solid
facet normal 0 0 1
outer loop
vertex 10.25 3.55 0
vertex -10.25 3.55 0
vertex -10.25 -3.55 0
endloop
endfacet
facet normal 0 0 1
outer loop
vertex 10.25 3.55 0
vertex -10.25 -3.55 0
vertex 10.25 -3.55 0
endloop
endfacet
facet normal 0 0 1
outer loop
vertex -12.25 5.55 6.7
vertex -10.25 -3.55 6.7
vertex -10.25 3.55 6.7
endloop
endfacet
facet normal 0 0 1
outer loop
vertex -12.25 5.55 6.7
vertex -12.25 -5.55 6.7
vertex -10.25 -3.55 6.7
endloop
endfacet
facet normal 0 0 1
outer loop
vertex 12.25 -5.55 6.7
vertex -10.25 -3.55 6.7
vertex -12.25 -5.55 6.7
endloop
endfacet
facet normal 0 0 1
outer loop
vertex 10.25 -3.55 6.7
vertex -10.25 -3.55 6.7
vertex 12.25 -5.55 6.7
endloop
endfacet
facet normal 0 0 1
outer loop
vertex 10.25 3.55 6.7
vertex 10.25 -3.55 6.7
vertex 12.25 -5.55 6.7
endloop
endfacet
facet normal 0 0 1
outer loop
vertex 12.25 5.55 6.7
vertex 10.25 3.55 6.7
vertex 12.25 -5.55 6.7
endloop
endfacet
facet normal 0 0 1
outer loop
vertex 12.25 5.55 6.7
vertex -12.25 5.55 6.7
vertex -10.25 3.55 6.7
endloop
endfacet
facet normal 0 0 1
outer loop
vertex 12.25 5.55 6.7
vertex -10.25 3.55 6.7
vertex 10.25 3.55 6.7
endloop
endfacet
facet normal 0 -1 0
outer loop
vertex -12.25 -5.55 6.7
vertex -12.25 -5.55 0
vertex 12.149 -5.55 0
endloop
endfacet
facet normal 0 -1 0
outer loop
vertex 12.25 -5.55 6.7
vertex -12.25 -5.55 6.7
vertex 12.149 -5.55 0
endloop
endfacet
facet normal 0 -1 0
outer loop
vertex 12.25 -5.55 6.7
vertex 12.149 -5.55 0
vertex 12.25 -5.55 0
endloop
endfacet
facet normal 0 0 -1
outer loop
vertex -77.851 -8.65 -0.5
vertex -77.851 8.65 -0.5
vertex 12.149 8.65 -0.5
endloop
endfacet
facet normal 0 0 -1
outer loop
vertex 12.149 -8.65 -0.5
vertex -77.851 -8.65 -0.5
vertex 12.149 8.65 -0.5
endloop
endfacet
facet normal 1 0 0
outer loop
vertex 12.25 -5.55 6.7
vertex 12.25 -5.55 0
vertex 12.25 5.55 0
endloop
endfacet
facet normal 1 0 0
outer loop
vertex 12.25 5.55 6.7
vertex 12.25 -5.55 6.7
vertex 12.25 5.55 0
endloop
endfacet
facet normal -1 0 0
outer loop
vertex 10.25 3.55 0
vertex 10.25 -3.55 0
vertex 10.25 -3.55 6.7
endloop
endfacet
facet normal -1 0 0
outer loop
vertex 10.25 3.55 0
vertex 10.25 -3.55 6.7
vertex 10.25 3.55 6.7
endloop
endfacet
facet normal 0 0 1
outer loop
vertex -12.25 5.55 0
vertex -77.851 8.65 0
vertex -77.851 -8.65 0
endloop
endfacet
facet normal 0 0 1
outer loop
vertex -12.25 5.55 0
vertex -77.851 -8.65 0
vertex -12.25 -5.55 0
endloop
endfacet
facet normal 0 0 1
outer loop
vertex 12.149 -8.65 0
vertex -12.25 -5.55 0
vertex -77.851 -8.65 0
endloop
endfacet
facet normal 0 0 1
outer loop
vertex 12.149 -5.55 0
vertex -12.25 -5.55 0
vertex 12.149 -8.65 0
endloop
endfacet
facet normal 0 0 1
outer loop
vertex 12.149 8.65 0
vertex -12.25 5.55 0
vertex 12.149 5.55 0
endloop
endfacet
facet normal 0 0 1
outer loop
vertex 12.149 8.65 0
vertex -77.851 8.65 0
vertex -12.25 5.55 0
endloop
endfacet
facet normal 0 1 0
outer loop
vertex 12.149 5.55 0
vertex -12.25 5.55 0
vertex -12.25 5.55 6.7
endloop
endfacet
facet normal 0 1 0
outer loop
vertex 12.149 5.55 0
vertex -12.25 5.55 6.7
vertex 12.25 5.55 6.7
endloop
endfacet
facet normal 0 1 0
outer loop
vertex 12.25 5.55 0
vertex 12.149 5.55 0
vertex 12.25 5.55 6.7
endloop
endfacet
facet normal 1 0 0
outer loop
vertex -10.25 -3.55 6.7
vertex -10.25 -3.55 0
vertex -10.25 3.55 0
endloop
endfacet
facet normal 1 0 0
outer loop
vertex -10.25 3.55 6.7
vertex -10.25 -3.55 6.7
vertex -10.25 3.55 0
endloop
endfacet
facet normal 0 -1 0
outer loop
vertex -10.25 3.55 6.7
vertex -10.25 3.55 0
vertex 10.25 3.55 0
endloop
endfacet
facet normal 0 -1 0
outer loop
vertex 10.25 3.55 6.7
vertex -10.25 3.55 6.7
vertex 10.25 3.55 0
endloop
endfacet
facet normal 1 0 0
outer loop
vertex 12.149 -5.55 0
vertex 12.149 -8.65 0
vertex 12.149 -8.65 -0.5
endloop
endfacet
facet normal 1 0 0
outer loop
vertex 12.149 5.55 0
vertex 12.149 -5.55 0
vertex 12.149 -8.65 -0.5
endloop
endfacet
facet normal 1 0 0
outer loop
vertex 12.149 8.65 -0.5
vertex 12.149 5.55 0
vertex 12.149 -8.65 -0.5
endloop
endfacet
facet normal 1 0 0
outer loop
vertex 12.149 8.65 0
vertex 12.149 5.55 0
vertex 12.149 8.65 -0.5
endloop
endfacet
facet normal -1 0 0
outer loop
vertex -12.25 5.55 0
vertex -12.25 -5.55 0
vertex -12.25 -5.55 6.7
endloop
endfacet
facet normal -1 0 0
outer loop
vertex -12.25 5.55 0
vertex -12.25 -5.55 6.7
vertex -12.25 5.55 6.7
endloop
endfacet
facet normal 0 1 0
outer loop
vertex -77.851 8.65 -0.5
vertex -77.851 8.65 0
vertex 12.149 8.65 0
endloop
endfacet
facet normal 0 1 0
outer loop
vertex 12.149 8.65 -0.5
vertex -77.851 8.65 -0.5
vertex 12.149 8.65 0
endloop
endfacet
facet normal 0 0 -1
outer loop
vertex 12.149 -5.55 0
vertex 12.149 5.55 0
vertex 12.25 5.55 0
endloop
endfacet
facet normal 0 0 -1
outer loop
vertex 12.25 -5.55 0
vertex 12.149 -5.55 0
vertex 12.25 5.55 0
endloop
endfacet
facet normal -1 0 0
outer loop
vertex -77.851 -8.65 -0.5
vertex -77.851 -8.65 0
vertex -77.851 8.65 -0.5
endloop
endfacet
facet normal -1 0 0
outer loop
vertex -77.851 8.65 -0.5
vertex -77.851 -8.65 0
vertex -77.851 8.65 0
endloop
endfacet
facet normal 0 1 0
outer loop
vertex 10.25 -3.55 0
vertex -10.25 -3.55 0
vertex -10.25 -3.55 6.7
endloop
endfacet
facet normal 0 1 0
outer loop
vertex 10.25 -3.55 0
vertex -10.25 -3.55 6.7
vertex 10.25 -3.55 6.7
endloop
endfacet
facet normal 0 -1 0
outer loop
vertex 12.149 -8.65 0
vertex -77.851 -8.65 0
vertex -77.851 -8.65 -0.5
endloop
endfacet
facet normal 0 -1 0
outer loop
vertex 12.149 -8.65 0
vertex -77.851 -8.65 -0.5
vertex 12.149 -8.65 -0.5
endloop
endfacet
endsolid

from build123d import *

# Parameters (mm, degrees)
SKETCH_W     = 24.5
SKETCH_H     = 11.1
SKETCH_W_2   = 20.5
SKETCH_H_2   = 7.1
PAD_DEPTH    = 6.7
SKETCH001_W  = 90
SKETCH001_H  = 17.3
PAD001_DEPTH = 0.5


with BuildPart() as part:
    # Sketch (on Sketch) → Pad (new body)
    with BuildSketch(Plane.XY):
        Rectangle(SKETCH_W, SKETCH_H)
        Rectangle(SKETCH_W_2, SKETCH_H_2, mode=Mode.SUBTRACT)
    extrude(amount=PAD_DEPTH)

    # Sketch001 → Pad001 (join)
    with BuildSketch(Plane.XY):
        with Locations((-32.851308, 0)):
            Rectangle(SKETCH001_W, SKETCH001_H)
    extrude(amount=-PAD001_DEPTH)


solid = part.part
